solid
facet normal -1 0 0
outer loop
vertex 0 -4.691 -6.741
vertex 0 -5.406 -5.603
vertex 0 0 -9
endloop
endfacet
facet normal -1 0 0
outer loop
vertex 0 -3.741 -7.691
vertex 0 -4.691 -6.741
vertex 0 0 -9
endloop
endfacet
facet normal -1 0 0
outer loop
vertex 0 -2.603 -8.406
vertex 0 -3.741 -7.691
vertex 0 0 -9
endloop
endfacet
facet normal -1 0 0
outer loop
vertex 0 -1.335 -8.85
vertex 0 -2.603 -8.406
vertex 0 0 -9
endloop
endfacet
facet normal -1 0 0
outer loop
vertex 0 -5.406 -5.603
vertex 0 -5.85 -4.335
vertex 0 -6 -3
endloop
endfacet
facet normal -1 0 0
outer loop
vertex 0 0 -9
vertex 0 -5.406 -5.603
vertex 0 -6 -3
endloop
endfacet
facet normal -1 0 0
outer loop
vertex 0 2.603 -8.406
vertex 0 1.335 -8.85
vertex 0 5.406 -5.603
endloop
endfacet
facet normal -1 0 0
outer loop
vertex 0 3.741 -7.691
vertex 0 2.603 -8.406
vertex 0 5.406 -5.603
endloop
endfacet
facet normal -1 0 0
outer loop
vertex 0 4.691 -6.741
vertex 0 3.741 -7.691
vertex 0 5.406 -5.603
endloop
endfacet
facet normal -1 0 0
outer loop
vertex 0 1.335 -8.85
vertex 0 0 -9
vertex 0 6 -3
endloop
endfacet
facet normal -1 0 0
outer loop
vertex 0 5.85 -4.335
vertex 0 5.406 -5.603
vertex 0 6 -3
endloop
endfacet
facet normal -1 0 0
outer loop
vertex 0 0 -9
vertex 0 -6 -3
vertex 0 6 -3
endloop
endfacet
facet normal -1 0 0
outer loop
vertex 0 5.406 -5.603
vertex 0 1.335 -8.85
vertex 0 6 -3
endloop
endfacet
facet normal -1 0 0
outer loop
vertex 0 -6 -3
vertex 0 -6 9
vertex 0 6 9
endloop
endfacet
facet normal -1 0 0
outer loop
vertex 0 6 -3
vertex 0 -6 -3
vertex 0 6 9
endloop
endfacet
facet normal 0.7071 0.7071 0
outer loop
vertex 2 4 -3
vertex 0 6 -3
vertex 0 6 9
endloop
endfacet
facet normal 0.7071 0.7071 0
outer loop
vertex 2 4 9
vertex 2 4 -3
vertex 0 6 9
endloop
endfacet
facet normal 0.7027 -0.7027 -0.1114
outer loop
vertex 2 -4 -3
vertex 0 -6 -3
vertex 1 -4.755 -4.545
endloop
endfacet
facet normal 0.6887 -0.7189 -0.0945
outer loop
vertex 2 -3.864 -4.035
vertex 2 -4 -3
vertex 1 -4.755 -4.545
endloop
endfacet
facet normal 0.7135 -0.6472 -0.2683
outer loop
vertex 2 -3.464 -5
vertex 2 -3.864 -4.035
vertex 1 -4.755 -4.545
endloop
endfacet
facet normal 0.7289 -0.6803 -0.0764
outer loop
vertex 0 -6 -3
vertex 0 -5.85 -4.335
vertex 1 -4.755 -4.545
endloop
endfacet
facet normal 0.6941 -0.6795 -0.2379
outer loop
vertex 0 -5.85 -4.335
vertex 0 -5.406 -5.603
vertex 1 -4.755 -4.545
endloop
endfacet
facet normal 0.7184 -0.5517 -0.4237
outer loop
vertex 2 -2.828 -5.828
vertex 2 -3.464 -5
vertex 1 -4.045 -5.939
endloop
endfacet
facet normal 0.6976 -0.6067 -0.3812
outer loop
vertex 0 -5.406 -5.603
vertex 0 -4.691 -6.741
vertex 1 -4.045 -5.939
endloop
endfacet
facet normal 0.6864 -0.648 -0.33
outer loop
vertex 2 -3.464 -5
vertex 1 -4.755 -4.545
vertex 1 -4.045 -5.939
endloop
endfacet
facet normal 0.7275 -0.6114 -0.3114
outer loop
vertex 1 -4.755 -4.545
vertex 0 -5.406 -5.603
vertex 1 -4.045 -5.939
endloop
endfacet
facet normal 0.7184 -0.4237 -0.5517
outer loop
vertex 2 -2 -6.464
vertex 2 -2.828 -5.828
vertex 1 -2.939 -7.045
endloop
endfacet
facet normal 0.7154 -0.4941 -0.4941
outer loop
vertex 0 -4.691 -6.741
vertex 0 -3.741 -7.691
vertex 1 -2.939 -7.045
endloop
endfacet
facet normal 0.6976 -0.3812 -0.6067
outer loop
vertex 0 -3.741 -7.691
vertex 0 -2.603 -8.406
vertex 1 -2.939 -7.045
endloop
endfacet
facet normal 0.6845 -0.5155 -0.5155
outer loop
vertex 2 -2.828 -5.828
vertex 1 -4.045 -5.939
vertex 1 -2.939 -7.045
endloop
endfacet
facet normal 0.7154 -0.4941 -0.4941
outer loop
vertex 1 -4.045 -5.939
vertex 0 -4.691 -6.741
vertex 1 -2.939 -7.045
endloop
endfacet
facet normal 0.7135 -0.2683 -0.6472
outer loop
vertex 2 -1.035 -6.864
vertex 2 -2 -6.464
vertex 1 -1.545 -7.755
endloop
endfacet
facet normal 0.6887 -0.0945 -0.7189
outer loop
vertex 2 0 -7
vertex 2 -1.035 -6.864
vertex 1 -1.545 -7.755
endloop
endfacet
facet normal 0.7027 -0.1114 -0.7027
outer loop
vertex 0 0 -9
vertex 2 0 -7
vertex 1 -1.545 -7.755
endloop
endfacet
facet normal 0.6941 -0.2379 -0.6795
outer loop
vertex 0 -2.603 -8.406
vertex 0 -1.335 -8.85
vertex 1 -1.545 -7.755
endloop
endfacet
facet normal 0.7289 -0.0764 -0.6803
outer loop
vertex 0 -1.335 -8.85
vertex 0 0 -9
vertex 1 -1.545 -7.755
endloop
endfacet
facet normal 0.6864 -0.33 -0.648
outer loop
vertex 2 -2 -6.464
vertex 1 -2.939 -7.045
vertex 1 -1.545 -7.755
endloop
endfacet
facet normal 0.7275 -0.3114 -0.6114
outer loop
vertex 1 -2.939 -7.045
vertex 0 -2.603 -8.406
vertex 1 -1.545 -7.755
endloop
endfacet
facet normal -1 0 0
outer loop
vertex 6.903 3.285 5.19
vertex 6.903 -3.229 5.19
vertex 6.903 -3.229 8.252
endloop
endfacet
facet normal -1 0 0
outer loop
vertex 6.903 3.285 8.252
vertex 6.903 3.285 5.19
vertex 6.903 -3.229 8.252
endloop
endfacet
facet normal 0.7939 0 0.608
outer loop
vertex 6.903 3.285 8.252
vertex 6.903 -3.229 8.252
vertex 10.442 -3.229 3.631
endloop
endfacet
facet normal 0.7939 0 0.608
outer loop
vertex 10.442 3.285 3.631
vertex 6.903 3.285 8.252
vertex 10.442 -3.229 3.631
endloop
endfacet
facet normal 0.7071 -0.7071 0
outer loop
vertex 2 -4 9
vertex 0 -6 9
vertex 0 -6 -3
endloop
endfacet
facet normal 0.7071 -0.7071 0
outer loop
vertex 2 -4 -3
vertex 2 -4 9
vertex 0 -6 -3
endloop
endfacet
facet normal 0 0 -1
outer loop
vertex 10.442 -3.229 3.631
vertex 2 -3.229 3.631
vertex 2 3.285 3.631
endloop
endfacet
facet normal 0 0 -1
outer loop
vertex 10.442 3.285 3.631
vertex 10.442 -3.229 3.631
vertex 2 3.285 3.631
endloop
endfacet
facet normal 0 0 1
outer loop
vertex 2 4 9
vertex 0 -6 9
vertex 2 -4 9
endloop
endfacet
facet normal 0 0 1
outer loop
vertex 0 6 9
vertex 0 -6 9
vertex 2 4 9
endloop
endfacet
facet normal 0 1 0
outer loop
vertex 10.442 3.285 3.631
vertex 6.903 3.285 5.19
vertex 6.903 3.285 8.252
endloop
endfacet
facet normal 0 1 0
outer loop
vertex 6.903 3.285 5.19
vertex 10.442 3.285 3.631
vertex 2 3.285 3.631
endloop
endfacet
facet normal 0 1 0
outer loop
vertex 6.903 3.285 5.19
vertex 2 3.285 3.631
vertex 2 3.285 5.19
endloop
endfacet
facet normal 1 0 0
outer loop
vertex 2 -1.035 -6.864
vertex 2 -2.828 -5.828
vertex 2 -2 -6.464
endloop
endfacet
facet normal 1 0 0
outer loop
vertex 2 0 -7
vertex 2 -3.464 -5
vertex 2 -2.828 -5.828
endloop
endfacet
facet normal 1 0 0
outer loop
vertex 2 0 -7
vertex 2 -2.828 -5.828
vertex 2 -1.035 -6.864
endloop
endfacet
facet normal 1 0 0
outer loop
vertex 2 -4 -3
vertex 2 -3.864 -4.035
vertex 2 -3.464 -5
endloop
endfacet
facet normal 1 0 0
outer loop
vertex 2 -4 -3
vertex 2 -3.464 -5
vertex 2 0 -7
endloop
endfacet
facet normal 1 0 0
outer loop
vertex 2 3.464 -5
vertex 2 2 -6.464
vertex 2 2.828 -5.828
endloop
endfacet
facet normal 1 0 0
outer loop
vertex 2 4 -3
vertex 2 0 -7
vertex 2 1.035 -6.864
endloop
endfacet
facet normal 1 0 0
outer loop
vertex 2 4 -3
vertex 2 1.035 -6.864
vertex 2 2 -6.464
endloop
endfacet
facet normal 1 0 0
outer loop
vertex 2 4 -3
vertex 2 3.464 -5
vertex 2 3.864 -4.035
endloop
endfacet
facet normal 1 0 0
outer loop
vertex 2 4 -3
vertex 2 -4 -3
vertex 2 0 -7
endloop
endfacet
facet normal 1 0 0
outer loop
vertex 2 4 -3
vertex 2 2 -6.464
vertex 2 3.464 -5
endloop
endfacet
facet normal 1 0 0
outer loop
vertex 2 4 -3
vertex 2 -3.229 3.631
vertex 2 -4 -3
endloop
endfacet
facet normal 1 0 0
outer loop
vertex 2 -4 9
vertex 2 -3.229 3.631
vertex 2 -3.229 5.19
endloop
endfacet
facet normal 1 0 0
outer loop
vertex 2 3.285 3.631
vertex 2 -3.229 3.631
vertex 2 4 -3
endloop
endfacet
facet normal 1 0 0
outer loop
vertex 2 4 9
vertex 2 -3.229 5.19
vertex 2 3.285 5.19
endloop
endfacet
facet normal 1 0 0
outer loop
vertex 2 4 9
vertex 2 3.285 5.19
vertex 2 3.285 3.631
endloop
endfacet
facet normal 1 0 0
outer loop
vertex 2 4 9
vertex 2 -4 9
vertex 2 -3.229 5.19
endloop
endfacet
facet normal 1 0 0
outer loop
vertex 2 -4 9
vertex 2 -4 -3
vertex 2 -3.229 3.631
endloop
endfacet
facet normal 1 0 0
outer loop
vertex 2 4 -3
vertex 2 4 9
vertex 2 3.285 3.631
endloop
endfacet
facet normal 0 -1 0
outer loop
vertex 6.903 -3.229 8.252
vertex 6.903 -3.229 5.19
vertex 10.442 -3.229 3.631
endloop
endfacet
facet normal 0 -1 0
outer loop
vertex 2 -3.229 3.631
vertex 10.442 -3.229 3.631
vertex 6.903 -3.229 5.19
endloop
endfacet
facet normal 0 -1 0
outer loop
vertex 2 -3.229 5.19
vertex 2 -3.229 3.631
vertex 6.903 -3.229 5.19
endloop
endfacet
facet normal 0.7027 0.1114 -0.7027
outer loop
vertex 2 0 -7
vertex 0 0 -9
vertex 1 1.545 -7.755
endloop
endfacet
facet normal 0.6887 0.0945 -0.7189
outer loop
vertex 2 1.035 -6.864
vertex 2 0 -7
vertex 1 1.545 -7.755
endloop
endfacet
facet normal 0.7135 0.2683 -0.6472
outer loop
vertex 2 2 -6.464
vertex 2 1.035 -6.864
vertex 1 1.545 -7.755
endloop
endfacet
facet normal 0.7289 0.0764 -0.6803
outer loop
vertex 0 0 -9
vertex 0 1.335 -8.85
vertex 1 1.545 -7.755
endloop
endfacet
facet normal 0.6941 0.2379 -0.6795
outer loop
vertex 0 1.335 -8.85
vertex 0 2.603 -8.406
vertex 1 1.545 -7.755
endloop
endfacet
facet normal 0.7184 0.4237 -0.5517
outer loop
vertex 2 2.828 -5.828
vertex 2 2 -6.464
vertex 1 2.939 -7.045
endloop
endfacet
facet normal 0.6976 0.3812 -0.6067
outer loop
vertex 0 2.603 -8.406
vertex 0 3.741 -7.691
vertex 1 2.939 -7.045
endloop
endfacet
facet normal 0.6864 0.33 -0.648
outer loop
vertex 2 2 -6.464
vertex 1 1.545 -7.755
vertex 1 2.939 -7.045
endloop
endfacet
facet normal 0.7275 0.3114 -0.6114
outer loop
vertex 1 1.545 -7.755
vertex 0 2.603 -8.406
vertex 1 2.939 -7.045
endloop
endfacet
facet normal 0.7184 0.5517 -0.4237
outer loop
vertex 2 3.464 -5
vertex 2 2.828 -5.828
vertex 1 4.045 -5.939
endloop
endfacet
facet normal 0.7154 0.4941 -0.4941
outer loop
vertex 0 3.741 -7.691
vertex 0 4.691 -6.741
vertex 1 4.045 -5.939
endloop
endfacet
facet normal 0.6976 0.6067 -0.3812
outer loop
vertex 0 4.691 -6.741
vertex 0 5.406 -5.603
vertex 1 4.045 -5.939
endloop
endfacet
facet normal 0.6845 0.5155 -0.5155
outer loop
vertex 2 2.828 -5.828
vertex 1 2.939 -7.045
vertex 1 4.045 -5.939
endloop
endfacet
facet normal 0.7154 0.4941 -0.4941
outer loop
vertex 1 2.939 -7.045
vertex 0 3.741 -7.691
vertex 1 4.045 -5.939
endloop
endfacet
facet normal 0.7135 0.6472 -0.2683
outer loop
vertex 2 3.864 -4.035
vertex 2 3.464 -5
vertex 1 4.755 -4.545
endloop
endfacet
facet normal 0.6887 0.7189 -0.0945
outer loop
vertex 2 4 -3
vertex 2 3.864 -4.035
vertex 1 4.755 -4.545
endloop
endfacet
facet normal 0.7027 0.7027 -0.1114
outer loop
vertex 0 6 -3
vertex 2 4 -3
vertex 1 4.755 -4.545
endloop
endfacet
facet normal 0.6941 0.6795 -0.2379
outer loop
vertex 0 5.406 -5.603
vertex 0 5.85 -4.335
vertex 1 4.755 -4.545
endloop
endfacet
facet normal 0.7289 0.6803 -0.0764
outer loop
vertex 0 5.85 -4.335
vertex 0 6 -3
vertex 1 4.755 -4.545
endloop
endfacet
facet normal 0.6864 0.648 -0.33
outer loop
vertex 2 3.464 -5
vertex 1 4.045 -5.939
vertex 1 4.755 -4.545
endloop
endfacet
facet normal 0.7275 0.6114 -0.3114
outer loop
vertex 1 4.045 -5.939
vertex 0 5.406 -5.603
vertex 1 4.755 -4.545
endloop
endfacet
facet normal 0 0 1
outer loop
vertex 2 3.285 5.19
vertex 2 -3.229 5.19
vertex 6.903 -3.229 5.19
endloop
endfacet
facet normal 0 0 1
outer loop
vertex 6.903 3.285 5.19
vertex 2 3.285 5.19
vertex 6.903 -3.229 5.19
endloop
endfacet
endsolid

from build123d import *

# Parameters (mm, degrees)
F0_W     = 12
F0_H     = 18
F1_DEPTH = 2
F3_R     = 5.99999
F4_SIZE  = 1.99999
F5_W     = 6.5143028369
F5_H     = 4.6212589368
F6_DEPTH = 10
F7_W     = 4.9025638513
F7_H     = 3.0622794293
F8_DEPTH = 25


# Not quite as in the source:
# - a fillet or chamfer is up to 0.001 mm smaller than in the source, because OpenCascade refuses the exact size


with BuildPart() as f1:
    # F0 (on Right) → F1 (new body)
    with BuildSketch(Plane.YZ):
        Rectangle(F0_W, F0_H)
    extrude(amount=F1_DEPTH)

    # F3 (radius 6 in the source; OpenCascade refuses exactly that, so slightly less here)
    f3_edges = [f1.edges().sort_by_distance(p)[0] for p in [
        (1, 6, -9),
        (1, -6, -9),
    ]]
    fillet(f3_edges, radius=F3_R)

    # F4 (size 2 in the source; OpenCascade refuses exactly that, so slightly less here)
    f4_edges = [f1.edges().sort_by_distance(p)[0] for p in [
        (2, 4.242644, -7.242644),
        (2, -6, 2.999995),
    ]]
    chamfer(f4_edges, length=F4_SIZE)

    # F5 (on face) → F6 (join)
    with BuildSketch(Plane.YZ.offset(2)):
        with Locations((0.0278381212, 5.9414044954)):
            Rectangle(F5_W, F5_H)
    extrude(amount=F6_DEPTH)

    # F7 (on face) → F8 (cut)
    with BuildSketch(Plane.XZ.offset(3.2293132972)):
        Polygon((6.9025638513, 9.0315220878), (6.9025638513, 8.2520339638), (10.911365971, 3.0183200724), (13.6395776644, 3.0183200724), (12.8879277036, 9.0315220878), align=None)
        with Locations((4.4512819257, 6.7208942492)):
            Rectangle(F7_W, F7_H)
    extrude(amount=-F8_DEPTH, mode=Mode.SUBTRACT)


solid = f1.part
